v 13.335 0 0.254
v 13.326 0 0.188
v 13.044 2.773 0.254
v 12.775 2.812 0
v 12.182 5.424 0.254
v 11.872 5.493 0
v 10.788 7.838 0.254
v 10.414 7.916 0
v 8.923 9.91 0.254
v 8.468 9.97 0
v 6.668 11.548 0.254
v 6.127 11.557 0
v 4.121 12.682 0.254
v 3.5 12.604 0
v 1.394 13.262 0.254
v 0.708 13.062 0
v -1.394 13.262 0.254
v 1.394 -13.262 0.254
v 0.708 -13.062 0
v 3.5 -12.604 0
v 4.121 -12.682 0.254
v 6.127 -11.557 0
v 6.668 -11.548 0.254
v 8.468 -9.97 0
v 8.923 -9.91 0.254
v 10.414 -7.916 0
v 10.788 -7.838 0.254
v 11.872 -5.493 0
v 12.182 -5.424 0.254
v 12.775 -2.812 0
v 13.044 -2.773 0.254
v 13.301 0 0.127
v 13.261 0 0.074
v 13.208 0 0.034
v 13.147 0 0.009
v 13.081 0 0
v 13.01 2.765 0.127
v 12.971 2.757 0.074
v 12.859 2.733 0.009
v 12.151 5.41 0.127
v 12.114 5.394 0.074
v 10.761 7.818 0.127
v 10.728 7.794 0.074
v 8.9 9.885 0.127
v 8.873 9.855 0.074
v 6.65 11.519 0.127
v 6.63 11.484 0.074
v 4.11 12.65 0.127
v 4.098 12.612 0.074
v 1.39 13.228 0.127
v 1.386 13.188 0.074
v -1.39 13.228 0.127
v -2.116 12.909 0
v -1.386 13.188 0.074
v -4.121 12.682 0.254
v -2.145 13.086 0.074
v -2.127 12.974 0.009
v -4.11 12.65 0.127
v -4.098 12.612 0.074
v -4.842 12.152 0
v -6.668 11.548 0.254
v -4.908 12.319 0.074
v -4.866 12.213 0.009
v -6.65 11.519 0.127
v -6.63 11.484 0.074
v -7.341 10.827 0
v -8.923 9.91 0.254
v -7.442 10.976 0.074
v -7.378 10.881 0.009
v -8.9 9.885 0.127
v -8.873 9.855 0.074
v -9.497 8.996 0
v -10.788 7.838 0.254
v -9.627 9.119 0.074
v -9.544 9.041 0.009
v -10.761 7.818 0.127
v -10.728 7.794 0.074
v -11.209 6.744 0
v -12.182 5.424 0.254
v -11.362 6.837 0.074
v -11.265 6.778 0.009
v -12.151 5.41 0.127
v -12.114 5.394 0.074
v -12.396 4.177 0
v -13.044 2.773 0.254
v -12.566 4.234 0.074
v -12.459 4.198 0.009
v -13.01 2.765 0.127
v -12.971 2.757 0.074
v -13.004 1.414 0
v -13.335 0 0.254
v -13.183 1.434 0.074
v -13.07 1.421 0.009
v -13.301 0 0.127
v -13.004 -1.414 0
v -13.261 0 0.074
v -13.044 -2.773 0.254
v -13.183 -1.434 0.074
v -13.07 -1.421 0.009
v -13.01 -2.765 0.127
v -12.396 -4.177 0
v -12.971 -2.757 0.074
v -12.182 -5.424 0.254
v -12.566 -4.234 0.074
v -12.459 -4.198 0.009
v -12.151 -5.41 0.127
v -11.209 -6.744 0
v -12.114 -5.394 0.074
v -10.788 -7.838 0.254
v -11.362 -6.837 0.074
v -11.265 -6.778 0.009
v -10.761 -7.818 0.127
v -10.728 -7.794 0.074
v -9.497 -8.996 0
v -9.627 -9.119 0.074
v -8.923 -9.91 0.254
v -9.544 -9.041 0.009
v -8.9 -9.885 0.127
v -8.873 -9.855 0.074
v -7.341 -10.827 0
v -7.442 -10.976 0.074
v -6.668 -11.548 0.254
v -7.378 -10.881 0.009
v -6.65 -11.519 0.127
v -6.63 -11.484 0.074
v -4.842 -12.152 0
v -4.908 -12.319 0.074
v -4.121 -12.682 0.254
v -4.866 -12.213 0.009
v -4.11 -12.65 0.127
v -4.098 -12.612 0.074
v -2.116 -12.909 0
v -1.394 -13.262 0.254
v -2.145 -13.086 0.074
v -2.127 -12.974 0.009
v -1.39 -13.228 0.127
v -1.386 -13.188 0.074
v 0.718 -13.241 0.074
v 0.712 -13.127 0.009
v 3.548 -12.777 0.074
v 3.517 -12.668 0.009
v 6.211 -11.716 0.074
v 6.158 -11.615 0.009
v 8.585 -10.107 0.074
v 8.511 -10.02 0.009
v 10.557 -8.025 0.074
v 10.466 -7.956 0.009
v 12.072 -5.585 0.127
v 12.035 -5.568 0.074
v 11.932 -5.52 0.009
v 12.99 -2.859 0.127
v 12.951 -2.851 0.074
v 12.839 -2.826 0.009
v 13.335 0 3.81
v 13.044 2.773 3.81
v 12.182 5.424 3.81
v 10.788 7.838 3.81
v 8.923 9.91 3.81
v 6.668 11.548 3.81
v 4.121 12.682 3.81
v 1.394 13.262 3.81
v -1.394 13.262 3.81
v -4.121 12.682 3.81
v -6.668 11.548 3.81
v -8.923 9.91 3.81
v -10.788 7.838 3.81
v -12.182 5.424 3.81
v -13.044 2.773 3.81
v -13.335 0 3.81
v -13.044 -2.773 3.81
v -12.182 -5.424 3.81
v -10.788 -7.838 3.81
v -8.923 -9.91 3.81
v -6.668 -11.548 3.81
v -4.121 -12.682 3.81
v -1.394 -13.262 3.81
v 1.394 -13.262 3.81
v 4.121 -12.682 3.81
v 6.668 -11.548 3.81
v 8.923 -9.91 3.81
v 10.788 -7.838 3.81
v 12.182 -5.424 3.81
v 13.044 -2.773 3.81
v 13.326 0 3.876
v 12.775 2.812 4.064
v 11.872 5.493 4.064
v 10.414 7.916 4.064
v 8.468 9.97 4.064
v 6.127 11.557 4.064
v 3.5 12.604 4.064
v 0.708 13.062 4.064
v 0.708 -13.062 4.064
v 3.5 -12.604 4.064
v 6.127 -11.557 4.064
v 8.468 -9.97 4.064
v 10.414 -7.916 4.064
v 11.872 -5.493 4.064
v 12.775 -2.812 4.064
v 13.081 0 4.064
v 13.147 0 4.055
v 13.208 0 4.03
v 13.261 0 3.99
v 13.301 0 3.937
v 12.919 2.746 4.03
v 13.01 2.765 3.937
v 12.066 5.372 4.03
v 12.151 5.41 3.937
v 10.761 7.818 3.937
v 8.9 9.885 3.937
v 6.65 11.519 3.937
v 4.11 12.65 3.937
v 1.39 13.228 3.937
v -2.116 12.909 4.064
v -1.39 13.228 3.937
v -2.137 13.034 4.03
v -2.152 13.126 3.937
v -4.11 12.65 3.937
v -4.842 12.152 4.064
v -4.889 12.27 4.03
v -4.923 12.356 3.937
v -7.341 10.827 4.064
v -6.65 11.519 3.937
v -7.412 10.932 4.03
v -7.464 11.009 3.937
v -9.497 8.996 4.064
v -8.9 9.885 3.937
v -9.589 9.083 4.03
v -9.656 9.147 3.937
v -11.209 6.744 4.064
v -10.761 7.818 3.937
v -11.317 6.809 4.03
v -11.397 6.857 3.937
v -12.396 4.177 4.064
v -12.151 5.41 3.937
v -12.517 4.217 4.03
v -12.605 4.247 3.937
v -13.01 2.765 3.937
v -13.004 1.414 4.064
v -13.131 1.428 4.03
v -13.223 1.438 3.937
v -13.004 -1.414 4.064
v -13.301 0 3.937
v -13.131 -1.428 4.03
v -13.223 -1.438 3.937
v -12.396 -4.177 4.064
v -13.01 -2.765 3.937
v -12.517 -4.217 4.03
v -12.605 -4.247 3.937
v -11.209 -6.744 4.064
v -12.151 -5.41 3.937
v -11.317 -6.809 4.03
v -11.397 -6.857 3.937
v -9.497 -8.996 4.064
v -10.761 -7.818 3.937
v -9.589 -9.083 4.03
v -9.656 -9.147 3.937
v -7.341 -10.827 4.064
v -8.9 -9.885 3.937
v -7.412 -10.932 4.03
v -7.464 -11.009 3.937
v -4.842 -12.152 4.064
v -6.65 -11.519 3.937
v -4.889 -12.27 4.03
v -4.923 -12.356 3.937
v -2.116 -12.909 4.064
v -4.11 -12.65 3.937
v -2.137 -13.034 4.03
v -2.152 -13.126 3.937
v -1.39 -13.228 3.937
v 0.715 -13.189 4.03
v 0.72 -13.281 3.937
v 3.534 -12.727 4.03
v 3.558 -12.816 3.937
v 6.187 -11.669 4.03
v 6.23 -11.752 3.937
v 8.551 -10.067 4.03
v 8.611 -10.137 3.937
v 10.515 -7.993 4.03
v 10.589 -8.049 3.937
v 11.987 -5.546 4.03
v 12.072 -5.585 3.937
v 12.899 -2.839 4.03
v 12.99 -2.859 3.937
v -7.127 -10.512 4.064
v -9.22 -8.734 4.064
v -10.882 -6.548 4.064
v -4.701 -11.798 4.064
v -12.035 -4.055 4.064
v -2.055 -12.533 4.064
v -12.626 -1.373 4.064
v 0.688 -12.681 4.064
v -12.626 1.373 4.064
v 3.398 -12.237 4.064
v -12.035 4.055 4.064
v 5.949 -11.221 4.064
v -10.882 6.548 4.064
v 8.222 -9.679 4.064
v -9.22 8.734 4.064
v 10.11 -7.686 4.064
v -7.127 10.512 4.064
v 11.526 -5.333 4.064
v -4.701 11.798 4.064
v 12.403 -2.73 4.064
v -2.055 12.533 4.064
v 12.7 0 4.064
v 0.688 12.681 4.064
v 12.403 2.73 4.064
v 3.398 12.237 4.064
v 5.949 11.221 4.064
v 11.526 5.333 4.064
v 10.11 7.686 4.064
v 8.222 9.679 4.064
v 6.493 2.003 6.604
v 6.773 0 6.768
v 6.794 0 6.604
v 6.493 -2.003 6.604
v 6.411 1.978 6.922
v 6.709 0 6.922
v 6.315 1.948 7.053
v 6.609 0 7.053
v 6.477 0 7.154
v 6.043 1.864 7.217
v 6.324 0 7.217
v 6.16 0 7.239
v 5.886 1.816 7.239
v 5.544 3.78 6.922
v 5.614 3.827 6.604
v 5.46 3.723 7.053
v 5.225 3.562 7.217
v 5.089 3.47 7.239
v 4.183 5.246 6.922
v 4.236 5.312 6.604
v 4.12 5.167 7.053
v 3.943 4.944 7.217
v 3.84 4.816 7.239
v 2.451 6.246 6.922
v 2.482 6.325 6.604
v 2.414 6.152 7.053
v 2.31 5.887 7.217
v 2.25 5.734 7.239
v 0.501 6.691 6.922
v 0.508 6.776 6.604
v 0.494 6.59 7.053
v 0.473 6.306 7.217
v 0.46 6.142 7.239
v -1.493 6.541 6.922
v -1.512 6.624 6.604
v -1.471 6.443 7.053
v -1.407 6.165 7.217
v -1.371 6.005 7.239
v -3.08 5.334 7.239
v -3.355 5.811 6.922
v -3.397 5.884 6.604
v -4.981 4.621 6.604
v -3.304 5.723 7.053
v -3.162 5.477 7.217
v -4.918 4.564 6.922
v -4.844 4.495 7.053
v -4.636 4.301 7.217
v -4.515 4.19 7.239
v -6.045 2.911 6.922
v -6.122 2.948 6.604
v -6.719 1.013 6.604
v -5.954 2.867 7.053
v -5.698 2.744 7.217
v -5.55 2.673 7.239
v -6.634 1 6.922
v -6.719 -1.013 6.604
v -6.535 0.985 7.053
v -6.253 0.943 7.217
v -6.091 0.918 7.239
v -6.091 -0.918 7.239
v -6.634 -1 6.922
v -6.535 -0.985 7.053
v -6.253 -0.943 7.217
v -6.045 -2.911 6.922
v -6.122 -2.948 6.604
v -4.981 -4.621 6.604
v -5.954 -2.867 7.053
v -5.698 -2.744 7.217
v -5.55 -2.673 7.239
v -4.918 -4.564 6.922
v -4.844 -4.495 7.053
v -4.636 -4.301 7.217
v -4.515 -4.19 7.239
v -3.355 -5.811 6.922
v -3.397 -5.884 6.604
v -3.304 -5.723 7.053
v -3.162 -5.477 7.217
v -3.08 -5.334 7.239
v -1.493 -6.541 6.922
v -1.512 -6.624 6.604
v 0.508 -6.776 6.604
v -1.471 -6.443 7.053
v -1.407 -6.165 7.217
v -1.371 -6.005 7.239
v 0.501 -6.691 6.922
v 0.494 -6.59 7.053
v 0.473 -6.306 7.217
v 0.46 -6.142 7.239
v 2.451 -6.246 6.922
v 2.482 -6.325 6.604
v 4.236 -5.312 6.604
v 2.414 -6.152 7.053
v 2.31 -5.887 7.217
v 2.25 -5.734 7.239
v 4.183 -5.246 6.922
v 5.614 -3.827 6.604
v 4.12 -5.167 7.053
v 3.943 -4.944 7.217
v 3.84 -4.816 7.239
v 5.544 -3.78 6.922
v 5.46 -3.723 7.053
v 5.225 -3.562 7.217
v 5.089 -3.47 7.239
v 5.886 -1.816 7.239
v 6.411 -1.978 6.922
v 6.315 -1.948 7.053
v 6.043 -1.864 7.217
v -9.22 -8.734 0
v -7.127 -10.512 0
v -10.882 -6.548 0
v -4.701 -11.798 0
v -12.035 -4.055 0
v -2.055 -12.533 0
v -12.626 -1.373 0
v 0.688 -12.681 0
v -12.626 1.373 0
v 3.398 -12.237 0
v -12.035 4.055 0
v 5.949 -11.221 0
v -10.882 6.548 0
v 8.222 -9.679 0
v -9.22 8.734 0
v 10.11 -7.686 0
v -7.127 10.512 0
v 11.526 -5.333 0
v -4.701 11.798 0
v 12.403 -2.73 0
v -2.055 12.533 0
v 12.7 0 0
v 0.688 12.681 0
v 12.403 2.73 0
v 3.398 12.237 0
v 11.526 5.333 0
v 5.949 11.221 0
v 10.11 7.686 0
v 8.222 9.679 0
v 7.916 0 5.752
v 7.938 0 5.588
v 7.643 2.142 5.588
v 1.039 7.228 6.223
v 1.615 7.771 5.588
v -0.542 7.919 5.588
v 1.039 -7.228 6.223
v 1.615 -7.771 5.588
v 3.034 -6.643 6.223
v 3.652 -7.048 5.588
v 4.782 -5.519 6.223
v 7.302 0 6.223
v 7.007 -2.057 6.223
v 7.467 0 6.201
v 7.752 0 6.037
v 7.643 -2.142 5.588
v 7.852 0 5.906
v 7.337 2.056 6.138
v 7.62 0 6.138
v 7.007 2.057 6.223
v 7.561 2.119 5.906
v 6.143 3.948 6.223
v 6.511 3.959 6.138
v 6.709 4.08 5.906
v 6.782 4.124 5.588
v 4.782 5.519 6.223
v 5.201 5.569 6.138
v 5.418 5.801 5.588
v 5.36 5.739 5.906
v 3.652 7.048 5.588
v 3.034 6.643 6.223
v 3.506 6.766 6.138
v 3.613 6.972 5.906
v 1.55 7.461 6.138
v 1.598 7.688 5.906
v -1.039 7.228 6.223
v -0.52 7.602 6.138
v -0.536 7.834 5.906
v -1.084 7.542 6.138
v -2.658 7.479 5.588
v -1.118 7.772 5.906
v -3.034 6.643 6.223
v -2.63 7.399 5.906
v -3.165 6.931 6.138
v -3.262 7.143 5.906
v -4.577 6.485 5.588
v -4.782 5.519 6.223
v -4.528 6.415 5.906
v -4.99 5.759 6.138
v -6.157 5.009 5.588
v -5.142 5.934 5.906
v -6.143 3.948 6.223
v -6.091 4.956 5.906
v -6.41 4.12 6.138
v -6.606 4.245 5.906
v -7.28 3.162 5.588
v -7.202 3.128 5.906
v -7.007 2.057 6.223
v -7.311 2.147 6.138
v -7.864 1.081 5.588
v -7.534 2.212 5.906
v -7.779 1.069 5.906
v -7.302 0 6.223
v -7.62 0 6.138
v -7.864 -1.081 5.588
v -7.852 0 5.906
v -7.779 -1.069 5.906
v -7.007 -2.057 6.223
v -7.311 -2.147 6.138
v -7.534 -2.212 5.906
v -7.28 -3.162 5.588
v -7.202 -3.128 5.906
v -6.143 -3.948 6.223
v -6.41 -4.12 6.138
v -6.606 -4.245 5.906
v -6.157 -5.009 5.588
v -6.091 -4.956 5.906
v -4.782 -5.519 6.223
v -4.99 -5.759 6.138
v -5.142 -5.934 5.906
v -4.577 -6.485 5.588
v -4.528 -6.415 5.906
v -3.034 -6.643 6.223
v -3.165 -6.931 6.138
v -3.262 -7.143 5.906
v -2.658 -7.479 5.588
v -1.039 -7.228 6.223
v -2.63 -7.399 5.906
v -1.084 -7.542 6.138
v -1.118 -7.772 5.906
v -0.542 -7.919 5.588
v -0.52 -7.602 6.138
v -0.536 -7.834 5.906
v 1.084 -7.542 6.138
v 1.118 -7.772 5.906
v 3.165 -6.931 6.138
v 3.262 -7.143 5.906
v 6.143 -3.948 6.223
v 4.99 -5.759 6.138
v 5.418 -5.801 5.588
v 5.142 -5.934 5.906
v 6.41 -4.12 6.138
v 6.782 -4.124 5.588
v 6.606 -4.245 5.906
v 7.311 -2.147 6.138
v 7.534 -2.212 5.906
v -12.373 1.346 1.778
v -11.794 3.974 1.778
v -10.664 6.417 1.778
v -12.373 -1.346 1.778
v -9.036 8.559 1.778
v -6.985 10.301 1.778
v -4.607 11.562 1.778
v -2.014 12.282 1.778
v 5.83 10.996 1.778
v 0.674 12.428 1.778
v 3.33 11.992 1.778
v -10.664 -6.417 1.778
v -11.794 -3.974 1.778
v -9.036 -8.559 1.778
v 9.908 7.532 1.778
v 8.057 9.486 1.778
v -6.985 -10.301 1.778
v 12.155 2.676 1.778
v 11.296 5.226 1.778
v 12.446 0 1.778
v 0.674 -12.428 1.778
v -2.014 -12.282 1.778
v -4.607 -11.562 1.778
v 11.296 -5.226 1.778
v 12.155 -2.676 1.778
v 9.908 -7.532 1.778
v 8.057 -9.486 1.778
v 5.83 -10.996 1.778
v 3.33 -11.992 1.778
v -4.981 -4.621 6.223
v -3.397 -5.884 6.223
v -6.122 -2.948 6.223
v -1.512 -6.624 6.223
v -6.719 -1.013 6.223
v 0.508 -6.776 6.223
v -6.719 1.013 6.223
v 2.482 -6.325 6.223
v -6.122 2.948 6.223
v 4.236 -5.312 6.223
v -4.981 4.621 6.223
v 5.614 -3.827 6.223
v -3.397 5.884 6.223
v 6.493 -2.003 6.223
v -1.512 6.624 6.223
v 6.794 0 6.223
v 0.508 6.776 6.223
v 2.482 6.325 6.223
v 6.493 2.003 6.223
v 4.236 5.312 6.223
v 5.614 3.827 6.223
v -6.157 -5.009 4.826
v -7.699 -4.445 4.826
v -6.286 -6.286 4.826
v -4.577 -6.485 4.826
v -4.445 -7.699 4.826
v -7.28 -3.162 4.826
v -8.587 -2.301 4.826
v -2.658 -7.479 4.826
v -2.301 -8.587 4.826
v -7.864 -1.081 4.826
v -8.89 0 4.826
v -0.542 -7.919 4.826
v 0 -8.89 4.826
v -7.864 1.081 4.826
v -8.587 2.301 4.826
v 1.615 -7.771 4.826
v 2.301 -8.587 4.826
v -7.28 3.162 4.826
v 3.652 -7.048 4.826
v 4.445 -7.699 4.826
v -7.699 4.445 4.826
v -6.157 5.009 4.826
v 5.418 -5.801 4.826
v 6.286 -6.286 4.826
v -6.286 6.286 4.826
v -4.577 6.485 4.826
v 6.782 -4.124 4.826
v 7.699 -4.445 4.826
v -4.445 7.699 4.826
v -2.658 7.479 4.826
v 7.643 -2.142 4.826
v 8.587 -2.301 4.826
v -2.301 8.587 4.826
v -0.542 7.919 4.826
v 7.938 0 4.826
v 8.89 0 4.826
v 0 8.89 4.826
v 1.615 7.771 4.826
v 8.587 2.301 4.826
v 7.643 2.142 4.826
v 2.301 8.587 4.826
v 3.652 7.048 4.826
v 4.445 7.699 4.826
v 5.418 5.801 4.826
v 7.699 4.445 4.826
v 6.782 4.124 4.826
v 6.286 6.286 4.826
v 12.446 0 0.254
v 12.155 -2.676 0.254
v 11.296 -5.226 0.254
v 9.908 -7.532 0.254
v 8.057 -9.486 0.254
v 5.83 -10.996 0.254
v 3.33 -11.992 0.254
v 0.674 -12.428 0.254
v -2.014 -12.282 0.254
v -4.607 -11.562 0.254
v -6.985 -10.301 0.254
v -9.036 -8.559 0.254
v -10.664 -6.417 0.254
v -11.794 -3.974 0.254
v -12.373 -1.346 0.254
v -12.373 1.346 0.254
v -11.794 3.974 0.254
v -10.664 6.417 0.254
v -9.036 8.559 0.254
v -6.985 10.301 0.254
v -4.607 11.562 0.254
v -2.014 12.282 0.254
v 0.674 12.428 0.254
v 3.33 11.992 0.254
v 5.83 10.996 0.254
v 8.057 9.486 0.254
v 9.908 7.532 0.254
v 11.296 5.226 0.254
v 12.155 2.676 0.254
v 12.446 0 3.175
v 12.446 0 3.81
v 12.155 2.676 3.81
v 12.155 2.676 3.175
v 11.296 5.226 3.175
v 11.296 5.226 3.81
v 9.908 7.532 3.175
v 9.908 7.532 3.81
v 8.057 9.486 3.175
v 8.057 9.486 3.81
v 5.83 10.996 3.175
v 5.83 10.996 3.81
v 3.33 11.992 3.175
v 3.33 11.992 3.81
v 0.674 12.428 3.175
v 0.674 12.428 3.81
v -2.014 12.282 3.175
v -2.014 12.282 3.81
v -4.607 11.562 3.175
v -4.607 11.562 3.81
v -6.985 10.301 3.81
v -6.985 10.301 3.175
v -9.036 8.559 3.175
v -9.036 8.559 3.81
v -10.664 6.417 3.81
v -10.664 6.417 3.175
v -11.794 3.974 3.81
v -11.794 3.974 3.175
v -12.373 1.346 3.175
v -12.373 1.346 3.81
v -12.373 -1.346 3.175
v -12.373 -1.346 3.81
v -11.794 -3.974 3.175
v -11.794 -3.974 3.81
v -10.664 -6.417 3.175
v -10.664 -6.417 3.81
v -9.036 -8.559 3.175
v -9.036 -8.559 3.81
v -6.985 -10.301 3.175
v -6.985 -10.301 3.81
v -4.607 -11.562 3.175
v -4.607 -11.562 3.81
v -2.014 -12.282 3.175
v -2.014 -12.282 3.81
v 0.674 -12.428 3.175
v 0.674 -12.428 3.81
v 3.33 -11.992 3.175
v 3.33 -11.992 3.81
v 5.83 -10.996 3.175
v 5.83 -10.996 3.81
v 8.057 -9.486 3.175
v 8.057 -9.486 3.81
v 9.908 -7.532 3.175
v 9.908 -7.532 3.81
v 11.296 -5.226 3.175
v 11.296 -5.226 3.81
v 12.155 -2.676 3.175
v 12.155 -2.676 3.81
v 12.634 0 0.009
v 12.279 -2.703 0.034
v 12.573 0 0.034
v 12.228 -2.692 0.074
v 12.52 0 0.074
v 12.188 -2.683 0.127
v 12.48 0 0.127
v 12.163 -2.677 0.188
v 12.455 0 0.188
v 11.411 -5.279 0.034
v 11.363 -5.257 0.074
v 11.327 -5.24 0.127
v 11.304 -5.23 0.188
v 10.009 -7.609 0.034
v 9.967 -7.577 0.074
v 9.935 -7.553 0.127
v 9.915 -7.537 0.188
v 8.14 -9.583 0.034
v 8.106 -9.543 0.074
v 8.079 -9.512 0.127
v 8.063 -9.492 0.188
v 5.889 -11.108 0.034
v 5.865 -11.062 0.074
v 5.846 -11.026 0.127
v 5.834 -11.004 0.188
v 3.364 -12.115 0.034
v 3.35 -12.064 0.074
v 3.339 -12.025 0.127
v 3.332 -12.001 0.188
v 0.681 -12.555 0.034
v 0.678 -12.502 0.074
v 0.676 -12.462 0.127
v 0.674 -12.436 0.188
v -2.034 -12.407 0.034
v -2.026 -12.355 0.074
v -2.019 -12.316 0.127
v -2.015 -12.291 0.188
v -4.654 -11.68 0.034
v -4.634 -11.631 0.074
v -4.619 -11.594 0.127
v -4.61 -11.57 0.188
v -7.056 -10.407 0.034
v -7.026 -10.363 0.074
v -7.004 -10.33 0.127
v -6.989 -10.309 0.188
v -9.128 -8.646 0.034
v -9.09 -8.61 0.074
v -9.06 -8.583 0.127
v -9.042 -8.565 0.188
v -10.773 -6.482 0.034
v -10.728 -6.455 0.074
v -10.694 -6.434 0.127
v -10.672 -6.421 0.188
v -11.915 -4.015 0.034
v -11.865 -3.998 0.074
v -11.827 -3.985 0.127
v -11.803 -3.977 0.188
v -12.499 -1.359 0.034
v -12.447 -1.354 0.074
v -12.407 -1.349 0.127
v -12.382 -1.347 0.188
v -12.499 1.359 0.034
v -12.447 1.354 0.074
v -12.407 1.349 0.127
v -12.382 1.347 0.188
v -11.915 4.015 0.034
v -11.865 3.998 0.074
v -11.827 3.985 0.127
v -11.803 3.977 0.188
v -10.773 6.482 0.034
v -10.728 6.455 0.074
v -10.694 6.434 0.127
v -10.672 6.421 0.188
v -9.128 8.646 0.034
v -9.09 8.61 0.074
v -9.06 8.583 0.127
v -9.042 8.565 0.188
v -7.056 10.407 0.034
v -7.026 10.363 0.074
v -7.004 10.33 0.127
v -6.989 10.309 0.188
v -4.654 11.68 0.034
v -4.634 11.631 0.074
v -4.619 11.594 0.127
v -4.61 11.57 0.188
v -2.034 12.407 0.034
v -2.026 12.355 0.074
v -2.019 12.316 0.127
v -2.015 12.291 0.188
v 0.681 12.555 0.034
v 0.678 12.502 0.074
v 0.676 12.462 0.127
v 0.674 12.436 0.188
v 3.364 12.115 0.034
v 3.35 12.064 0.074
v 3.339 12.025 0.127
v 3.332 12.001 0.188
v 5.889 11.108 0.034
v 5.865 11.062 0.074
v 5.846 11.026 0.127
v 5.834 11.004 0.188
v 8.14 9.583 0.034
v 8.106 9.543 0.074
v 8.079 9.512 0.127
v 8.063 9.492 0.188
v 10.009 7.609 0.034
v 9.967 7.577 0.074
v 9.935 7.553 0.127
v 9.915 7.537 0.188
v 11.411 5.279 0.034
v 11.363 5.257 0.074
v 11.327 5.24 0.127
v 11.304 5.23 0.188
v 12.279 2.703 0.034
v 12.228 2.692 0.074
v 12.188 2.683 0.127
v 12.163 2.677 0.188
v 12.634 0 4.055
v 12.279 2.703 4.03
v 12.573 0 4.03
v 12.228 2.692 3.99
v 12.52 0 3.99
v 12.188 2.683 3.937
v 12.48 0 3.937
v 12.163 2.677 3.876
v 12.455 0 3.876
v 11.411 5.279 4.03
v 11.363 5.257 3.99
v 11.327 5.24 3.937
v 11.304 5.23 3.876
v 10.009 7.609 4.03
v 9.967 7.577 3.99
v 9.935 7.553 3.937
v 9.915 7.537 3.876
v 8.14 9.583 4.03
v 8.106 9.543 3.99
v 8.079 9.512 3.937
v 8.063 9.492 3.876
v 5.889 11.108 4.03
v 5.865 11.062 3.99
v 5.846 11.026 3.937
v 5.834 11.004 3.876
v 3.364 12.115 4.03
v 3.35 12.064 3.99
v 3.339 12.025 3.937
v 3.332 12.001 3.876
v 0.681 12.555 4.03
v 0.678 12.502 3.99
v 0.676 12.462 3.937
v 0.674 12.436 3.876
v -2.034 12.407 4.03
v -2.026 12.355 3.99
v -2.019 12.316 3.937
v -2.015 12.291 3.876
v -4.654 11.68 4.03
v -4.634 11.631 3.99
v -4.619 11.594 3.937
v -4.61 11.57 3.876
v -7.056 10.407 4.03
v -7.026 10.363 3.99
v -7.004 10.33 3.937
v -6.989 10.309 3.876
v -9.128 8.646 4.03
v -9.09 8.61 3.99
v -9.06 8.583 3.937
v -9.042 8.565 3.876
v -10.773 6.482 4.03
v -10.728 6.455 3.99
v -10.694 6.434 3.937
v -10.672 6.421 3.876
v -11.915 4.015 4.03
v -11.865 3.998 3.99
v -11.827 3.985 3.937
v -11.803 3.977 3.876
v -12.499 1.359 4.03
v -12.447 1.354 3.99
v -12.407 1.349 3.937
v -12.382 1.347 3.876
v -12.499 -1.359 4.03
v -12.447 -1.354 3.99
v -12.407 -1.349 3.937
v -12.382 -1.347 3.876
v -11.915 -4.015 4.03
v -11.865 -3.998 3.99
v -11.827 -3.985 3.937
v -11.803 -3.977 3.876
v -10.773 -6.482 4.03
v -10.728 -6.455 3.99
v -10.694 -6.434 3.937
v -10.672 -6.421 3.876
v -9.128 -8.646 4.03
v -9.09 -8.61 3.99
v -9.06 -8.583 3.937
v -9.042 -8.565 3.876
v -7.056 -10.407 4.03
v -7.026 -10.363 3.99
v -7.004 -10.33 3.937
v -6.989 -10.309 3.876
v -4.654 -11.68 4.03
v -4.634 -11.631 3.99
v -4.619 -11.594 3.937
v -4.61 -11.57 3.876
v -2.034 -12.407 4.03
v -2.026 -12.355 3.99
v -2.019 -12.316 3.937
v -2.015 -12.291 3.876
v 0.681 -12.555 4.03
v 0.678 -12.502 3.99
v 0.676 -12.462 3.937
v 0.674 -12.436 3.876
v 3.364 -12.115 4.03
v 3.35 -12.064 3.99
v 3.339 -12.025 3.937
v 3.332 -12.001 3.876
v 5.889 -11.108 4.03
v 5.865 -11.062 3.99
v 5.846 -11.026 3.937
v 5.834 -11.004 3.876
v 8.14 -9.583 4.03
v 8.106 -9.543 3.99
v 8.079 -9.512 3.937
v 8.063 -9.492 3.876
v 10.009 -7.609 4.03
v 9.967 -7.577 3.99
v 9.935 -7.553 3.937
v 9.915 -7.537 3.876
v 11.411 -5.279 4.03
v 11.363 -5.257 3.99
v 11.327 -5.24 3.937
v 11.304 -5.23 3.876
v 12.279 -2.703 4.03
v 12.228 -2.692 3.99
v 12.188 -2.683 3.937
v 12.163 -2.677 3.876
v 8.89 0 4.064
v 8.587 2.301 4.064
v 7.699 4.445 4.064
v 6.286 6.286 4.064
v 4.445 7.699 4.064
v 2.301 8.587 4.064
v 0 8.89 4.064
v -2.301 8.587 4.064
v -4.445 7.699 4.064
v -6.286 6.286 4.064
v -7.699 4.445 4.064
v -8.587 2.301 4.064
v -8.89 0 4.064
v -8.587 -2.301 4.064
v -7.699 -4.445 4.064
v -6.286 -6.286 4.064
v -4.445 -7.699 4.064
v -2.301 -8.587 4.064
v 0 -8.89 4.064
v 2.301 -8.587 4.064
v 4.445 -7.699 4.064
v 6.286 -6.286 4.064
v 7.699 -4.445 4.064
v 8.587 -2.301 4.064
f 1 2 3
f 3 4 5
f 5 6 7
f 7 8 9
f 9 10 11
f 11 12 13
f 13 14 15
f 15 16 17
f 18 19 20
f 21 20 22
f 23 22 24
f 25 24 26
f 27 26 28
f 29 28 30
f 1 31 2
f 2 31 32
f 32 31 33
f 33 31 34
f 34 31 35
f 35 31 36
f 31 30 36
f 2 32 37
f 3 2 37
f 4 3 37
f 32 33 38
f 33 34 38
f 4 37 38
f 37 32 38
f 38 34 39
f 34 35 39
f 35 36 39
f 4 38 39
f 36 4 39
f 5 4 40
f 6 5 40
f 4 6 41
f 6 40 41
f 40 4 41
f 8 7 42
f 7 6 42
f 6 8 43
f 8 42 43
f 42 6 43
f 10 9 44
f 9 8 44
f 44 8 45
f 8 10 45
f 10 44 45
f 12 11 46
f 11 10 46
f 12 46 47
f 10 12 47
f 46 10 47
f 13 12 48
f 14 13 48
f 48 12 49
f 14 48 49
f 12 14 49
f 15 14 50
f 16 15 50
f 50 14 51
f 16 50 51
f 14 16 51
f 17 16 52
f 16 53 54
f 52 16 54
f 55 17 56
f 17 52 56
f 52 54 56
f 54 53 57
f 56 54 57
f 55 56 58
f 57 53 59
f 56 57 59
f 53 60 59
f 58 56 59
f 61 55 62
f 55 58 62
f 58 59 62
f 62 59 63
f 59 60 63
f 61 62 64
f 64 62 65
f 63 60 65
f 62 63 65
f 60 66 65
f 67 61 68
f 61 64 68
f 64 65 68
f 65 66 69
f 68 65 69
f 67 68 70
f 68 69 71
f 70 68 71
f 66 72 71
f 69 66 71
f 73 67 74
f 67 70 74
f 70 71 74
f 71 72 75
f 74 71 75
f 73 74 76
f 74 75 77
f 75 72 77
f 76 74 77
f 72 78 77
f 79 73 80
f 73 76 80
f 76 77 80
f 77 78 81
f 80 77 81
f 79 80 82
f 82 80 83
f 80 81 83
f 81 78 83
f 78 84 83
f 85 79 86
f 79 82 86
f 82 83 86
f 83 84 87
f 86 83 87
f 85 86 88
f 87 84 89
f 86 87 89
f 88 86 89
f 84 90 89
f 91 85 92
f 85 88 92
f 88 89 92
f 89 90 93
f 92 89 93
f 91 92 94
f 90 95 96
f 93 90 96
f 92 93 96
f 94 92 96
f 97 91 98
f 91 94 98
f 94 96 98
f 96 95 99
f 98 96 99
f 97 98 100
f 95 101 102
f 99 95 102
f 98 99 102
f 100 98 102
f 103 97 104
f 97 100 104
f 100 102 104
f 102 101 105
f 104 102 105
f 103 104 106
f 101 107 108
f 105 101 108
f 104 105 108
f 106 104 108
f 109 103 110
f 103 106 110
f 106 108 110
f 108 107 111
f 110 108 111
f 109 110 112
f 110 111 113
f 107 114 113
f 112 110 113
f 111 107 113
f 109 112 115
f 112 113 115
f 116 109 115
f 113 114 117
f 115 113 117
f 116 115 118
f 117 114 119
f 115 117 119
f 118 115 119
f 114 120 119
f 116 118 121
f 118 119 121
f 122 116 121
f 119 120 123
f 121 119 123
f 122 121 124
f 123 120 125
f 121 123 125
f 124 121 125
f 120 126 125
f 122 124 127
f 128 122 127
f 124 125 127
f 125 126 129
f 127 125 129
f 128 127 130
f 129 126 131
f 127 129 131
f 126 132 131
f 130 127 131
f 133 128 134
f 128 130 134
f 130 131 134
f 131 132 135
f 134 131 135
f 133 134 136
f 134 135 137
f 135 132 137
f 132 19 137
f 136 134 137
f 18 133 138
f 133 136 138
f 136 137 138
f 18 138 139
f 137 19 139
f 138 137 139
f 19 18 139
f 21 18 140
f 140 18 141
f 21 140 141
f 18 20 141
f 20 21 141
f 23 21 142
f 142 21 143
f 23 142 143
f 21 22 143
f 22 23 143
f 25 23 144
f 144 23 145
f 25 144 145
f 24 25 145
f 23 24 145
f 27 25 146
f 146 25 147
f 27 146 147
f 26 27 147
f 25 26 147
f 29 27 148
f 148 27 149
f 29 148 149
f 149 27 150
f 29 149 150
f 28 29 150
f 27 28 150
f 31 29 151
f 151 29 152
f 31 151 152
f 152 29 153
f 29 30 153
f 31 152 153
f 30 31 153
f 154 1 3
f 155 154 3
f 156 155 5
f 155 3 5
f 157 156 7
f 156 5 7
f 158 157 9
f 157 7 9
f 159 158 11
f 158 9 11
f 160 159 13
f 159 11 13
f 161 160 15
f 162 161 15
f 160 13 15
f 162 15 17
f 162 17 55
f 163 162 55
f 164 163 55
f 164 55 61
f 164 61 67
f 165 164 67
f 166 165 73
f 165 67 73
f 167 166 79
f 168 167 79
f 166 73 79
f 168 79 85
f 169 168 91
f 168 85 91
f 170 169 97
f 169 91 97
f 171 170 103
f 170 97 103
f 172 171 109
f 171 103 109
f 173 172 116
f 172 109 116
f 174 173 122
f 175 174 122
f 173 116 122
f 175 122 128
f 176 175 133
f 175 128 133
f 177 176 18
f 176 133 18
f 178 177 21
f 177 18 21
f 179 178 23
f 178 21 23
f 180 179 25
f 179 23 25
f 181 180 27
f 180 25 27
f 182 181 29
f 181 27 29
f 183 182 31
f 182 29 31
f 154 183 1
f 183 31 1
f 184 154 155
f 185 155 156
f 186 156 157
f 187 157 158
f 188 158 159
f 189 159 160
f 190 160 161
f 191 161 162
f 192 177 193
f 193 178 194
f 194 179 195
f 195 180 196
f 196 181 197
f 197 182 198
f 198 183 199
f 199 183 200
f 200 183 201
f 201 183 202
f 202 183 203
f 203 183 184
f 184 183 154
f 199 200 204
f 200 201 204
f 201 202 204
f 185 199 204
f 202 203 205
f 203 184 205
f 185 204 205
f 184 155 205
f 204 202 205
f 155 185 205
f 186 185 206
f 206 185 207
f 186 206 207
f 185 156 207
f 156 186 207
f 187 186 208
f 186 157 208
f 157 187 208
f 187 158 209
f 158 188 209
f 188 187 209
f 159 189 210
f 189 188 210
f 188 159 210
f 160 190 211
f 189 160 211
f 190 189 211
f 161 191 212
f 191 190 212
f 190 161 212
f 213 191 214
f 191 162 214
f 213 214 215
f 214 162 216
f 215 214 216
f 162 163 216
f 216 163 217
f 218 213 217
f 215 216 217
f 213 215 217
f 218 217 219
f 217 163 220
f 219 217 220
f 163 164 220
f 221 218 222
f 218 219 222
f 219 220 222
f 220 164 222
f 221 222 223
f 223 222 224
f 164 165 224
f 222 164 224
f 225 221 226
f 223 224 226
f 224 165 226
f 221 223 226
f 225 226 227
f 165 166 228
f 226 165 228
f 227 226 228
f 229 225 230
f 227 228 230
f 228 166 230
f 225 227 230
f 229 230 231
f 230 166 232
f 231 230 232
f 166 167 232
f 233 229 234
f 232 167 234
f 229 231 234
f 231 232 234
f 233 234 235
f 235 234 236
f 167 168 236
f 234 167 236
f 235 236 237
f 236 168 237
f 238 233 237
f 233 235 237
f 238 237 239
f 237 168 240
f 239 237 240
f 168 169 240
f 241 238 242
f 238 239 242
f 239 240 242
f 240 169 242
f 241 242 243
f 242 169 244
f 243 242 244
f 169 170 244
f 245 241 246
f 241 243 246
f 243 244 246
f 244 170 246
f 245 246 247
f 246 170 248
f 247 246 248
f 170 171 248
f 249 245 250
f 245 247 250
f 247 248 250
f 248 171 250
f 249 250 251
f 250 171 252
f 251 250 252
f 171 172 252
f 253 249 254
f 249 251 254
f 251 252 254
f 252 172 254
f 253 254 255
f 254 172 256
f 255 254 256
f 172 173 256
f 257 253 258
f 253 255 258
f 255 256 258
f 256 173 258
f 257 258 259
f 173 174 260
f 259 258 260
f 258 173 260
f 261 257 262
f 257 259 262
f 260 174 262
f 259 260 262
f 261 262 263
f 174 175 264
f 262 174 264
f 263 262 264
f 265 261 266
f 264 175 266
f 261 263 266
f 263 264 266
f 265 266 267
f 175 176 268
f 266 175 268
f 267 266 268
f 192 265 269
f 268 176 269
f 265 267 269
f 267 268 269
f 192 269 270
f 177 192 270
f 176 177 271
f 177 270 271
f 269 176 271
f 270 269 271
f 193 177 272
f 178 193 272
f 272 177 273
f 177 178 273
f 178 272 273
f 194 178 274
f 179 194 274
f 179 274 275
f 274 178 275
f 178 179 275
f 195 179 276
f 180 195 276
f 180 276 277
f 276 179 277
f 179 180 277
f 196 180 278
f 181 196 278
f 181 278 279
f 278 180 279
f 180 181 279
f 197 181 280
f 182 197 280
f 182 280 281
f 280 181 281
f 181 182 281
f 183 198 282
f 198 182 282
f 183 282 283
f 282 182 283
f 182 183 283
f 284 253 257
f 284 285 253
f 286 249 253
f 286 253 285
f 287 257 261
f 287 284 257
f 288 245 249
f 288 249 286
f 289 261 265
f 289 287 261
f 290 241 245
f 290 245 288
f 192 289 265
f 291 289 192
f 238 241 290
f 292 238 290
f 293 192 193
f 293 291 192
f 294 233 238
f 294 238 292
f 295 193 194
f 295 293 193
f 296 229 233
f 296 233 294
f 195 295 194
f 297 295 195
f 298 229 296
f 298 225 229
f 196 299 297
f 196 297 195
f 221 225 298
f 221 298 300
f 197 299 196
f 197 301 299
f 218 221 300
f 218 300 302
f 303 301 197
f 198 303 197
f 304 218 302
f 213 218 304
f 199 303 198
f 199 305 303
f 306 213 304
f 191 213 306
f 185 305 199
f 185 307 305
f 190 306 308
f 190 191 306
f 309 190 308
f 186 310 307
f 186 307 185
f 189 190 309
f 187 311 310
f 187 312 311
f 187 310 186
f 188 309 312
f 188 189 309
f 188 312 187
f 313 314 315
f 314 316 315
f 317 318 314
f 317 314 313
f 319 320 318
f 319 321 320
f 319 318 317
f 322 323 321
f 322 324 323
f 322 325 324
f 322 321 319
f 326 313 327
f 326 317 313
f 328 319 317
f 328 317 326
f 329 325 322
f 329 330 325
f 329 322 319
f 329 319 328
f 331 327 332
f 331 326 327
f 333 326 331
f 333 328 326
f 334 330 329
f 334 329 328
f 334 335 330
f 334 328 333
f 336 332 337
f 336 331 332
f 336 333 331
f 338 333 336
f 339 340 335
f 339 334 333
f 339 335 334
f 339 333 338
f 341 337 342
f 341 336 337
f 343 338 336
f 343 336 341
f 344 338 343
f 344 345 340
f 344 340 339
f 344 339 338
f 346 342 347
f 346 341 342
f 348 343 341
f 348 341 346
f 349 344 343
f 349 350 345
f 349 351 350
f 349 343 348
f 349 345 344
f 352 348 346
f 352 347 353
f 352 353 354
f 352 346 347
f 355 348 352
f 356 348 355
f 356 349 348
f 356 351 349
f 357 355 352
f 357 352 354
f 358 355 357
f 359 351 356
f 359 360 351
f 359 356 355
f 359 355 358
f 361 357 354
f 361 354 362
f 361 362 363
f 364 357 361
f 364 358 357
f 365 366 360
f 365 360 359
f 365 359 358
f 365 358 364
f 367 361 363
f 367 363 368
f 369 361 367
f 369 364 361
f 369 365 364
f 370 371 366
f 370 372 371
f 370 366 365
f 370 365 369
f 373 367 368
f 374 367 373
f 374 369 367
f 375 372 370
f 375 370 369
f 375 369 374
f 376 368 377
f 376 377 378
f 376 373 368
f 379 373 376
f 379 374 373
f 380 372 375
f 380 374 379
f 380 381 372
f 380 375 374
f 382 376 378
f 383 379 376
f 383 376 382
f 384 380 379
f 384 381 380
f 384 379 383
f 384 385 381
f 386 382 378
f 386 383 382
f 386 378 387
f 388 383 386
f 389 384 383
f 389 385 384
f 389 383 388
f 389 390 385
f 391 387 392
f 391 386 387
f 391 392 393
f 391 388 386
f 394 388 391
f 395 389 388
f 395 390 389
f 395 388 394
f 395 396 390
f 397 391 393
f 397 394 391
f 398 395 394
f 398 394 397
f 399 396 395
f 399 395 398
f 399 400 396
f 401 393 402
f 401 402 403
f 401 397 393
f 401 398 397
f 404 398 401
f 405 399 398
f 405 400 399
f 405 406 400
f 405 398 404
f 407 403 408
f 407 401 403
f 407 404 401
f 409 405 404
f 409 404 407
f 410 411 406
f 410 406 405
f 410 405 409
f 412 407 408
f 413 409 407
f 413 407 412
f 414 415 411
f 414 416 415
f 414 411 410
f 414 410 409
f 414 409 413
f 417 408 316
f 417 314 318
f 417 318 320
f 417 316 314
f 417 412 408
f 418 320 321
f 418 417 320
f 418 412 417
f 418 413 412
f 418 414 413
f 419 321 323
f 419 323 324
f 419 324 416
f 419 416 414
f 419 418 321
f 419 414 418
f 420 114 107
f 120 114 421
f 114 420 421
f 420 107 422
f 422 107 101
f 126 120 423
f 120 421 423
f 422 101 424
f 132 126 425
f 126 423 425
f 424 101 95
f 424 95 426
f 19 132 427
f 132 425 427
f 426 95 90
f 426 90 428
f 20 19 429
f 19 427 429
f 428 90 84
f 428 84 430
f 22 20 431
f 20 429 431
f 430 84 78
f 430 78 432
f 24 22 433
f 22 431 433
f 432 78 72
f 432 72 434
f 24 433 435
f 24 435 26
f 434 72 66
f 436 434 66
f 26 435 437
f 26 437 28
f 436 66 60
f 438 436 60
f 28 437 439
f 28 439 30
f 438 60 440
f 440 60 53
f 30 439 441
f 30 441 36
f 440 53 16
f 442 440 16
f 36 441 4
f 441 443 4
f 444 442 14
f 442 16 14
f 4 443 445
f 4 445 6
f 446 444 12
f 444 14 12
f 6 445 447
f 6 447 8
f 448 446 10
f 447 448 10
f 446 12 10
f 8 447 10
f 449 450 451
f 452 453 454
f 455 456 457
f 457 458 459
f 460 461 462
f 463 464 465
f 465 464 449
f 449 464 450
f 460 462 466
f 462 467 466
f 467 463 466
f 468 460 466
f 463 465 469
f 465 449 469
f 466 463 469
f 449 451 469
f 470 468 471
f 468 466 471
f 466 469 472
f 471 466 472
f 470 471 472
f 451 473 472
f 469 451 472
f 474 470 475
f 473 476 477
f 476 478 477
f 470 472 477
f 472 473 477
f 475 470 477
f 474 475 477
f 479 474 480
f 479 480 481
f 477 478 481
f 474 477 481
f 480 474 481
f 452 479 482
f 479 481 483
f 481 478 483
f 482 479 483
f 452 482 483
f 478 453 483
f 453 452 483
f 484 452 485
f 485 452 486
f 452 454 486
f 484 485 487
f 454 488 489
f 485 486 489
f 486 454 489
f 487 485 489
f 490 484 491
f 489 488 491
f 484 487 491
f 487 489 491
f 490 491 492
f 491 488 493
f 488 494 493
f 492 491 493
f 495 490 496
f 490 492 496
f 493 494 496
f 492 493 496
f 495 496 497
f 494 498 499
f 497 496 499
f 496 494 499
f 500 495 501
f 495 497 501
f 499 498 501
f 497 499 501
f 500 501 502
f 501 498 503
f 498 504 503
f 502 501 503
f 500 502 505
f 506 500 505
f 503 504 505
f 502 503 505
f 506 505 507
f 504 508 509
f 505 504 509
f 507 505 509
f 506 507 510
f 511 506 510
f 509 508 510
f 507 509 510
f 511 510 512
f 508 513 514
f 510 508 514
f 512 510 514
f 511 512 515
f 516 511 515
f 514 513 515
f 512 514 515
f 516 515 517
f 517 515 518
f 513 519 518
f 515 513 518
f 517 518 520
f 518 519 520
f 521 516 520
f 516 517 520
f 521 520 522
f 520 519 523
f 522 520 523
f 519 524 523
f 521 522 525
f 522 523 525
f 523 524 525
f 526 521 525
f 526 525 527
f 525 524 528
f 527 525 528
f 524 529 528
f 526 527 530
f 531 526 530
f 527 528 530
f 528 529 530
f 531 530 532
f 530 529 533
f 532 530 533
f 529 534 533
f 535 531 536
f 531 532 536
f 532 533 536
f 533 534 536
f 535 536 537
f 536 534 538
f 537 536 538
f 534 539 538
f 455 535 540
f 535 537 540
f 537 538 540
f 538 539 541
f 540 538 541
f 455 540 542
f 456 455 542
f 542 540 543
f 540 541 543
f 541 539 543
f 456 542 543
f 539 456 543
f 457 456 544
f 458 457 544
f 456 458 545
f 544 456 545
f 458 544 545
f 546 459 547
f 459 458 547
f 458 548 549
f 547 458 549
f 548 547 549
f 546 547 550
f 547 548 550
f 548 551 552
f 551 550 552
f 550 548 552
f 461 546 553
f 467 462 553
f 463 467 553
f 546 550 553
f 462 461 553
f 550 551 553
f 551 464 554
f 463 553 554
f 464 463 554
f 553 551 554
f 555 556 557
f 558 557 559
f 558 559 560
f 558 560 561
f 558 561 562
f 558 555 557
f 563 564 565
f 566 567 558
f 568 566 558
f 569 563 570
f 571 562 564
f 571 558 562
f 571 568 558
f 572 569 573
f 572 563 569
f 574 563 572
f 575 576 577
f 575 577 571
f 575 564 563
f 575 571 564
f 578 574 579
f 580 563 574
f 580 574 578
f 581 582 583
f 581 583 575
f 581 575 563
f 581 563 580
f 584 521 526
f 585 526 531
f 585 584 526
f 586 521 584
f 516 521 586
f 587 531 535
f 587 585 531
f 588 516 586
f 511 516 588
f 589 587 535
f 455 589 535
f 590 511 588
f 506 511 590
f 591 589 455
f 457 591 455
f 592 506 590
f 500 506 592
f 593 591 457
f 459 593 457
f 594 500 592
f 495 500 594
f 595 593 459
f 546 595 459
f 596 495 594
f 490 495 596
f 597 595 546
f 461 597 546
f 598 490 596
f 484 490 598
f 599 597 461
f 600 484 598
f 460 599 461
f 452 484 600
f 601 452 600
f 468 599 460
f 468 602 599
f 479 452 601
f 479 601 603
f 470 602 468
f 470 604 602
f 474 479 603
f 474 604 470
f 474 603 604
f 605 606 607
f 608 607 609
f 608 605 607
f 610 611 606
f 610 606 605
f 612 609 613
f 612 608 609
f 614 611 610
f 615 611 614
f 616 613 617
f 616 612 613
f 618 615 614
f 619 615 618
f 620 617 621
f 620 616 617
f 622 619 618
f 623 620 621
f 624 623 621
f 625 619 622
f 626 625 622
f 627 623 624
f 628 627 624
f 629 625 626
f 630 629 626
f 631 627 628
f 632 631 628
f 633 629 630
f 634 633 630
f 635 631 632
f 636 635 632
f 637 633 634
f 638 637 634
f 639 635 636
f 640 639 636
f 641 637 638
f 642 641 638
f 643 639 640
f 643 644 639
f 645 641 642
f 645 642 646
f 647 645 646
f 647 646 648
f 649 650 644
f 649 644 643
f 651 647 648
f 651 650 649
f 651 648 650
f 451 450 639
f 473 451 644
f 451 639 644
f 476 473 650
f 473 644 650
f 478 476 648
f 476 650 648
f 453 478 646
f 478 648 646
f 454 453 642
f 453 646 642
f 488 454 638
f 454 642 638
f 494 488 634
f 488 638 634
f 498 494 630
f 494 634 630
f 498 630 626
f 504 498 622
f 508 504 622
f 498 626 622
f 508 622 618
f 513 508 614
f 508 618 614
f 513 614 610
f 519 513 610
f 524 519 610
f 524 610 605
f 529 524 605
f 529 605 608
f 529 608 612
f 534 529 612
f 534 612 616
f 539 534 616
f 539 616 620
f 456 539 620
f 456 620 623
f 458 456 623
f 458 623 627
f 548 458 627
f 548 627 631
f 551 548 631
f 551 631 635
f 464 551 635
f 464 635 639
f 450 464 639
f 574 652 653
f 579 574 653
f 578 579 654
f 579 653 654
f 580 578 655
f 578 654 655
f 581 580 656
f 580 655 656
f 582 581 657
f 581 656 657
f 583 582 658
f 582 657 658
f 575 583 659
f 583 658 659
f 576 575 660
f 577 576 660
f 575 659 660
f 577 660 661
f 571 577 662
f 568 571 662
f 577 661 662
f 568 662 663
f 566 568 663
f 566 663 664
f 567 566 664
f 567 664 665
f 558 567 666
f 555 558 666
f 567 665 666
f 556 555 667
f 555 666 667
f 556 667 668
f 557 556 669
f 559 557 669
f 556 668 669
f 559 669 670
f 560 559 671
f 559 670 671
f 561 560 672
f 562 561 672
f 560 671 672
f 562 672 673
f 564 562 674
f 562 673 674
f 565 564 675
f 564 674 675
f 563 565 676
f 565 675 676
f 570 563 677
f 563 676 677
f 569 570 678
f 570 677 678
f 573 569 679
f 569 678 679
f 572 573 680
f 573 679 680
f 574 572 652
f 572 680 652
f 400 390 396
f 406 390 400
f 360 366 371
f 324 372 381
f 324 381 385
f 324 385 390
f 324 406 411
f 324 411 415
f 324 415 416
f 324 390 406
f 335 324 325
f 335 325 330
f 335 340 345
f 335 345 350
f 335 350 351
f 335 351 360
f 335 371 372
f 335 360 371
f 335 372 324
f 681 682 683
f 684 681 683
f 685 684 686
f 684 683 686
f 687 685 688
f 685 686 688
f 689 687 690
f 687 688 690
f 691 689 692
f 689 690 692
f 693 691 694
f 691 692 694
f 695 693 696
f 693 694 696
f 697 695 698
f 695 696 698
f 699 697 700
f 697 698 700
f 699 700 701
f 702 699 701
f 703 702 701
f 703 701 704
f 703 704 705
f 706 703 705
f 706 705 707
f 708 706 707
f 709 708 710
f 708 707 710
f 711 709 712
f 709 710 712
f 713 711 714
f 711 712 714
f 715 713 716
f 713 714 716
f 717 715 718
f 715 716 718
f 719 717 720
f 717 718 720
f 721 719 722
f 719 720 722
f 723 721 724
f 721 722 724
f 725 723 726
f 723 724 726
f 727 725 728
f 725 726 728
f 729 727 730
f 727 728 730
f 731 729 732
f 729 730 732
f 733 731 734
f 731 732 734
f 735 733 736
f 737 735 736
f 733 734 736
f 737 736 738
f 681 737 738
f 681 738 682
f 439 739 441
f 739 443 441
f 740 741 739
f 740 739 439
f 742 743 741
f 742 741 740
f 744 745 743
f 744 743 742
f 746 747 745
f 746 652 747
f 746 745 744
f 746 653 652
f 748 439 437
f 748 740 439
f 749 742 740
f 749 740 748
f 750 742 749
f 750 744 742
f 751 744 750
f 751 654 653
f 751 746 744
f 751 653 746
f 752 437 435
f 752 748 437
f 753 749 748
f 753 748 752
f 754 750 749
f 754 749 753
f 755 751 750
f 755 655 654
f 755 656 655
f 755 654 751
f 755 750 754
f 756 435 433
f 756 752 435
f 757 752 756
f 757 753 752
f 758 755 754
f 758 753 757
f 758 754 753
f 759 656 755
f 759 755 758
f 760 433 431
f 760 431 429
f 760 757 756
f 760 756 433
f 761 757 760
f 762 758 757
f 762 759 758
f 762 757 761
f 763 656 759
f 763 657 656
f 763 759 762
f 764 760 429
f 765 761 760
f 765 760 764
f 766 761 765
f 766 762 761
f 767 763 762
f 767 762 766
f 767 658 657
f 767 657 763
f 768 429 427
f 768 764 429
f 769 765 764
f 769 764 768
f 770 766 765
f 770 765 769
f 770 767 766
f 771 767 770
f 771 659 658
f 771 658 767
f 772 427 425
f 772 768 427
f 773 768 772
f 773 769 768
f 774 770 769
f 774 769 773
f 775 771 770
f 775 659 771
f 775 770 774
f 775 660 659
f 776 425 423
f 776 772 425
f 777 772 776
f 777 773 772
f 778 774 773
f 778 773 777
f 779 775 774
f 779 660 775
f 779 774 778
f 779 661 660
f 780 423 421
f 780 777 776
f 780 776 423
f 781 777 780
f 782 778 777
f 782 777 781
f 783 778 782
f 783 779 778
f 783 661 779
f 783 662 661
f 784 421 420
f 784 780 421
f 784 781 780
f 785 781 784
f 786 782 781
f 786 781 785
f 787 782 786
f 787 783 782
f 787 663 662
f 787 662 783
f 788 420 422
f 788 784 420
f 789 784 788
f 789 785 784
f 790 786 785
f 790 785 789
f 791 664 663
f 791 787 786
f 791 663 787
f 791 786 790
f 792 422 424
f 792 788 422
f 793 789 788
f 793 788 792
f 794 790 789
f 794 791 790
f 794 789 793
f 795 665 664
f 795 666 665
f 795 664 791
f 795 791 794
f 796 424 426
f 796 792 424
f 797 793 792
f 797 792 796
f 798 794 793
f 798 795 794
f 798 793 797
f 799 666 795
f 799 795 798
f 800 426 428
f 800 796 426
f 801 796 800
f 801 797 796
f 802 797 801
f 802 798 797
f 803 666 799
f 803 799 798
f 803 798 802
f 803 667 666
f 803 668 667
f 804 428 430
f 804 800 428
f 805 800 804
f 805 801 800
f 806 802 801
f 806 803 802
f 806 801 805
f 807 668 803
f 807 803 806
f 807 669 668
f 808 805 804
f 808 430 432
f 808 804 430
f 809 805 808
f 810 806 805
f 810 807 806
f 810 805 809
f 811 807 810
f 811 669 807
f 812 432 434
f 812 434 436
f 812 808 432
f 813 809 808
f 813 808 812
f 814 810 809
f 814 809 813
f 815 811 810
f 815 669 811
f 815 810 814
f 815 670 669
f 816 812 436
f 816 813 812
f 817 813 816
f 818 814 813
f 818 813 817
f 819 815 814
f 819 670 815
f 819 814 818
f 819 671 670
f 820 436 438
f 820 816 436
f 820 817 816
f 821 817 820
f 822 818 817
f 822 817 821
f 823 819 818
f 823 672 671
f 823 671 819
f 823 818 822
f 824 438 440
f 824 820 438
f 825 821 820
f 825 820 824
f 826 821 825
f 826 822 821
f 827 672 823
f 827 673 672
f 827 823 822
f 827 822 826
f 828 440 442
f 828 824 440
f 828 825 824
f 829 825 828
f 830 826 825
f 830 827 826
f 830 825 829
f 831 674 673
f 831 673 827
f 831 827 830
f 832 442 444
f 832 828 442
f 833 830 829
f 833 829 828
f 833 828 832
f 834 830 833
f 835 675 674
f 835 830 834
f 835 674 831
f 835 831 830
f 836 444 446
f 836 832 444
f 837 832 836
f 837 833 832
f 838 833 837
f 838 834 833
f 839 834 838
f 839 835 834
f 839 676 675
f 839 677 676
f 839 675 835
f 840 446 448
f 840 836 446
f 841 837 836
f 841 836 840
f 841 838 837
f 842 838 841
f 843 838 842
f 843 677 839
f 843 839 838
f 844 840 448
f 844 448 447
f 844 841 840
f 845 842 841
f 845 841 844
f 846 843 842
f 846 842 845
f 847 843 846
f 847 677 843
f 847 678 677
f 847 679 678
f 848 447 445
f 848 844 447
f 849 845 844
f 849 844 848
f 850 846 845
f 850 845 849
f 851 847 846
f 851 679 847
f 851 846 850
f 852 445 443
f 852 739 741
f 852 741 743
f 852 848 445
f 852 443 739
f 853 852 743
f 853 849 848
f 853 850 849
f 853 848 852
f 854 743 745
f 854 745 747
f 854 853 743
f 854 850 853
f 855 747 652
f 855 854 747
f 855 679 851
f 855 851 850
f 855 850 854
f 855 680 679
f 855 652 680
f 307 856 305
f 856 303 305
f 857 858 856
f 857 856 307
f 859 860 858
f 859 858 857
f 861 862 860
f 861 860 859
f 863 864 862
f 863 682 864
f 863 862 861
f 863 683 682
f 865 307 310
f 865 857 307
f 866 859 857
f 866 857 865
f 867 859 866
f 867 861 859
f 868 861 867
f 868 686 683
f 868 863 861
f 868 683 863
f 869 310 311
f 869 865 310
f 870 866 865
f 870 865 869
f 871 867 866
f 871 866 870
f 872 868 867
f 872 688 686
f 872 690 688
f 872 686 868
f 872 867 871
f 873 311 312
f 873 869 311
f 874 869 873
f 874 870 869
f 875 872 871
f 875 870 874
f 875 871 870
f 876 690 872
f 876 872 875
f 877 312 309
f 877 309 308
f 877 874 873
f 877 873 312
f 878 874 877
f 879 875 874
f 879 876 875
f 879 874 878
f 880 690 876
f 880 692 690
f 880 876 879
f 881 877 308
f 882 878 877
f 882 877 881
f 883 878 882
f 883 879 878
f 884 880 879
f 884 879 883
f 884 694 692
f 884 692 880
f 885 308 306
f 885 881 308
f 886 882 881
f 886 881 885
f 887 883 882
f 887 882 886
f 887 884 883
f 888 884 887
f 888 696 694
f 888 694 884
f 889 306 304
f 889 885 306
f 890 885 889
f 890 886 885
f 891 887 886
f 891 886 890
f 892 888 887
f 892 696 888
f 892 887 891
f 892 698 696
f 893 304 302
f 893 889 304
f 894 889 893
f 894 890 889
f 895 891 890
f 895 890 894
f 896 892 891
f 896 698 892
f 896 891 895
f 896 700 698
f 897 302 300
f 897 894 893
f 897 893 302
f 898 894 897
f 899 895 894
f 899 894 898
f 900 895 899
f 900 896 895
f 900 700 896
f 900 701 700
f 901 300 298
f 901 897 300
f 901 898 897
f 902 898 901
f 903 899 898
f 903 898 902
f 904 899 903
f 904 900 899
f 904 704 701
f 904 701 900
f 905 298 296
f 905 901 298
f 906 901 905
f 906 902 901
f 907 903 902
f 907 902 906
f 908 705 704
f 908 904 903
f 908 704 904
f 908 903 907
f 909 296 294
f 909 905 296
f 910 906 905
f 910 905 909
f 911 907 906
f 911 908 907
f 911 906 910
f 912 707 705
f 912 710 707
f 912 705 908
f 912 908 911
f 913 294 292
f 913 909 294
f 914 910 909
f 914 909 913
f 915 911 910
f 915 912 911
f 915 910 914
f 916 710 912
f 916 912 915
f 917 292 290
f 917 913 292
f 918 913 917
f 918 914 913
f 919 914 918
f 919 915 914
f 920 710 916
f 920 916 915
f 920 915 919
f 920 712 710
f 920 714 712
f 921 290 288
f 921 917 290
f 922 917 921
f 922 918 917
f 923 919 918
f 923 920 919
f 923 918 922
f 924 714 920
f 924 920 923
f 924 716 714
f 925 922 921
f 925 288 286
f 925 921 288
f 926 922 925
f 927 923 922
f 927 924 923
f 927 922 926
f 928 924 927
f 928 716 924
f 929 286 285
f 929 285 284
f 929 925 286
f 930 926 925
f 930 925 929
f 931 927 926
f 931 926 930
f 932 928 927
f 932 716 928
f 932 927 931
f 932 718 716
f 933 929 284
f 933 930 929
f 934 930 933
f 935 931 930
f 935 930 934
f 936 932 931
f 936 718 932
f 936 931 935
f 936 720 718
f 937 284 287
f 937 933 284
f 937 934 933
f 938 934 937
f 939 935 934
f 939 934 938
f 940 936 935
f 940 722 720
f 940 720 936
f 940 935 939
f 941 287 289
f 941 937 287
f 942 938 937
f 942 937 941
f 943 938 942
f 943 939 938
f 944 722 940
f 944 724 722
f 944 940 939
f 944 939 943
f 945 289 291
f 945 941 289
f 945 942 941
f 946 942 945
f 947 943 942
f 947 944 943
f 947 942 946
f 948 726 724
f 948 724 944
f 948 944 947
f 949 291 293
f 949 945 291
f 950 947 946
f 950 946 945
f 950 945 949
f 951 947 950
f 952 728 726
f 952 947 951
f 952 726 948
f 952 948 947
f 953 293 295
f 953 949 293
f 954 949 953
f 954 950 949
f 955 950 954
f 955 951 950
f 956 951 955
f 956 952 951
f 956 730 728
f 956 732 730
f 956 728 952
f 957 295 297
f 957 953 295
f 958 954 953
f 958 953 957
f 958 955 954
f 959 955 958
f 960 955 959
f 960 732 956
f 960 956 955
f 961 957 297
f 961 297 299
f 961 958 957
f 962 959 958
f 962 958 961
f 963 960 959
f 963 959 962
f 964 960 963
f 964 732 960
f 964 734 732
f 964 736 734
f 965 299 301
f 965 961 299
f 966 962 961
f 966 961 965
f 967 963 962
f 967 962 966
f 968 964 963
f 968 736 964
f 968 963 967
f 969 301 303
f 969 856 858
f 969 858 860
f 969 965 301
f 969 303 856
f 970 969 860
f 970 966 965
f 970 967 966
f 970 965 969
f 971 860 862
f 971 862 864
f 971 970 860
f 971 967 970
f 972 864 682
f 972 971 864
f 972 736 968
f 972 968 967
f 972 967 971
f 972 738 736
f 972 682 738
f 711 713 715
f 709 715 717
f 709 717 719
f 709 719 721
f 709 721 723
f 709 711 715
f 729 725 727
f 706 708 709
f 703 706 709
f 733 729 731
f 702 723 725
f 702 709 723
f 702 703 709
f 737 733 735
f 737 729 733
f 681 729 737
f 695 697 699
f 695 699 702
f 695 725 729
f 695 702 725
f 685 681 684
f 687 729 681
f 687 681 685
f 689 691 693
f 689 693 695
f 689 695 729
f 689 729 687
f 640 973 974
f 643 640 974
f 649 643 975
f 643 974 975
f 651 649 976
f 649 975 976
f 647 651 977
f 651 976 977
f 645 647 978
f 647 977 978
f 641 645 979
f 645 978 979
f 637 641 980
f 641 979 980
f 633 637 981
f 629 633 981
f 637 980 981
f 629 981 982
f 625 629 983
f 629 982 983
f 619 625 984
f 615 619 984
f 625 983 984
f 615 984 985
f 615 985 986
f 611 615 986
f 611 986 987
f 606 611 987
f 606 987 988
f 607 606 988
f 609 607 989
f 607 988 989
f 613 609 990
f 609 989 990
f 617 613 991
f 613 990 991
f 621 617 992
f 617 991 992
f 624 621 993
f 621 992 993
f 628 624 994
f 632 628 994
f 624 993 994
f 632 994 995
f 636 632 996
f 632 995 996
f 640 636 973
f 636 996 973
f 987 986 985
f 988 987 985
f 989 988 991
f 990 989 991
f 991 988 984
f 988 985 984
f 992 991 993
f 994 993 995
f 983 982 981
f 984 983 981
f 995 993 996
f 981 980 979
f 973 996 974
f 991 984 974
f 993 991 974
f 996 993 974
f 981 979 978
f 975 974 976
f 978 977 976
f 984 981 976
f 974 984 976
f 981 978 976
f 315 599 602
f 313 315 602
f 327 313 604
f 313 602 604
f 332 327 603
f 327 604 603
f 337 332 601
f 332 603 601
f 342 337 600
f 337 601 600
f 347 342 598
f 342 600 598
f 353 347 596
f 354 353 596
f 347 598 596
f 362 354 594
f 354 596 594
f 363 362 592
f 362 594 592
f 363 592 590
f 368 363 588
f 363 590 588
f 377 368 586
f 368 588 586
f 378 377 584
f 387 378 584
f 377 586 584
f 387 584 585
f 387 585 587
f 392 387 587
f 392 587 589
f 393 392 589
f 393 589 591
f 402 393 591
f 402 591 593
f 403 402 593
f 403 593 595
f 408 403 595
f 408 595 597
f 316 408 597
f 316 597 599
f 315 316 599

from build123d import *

# Parameters (mm, degrees)
F0_R      = 13.335
F1_DEPTH  = 4.064
F2_R      = 8.89
F3_DEPTH  = 0.762
F4_R      = 7.9375
F5_DEPTH  = 2.159
F6_R      = 6.7945
F7_DEPTH  = 3.175
F8_R      = 0.635
F9_R      = 12.446
F10_DEPTH = 0.889
F11_R     = 12.446
F12_DEPTH = 1.778
F13_R     = 0.254


with BuildPart() as f1:
    # F0 (on Top) → F1 (new body)
    with BuildSketch(Plane.XY):
        Circle(F0_R)
    extrude(amount=F1_DEPTH)

    # F2 (on face) → F3 (join)
    with BuildSketch(Plane.XY.offset(4.064)):
        Circle(F2_R)
    extrude(amount=F3_DEPTH)

    # F4 (on face) → F5 (join)
    with BuildSketch(Plane.XY.offset(4.064)):
        Circle(F4_R)
    extrude(amount=F5_DEPTH)

    # F6 (on face) → F7 (join)
    with BuildSketch(Plane.XY.offset(4.064)):
        Circle(F6_R)
    extrude(amount=F7_DEPTH)

    # F8
    f8_edges = [f1.edges().sort_by_distance(p)[0] for p in [
        (-7.9375, 0, 6.223),
        (-6.7945, 0, 7.239),
    ]]
    fillet(f8_edges, radius=F8_R)

    # F9 (on face) → F10 (cut)
    with BuildSketch(Plane.XY.offset(4.064)):
        Circle(F9_R)
    extrude(amount=-F10_DEPTH, mode=Mode.SUBTRACT)

    # F11 (on face) → F12 (cut)
    with BuildSketch(Plane(origin=(0, 0, 0), x_dir=(1, 0, 0), z_dir=(0, 0, -1))):
        Circle(F11_R)
    extrude(amount=-F12_DEPTH, mode=Mode.SUBTRACT)

    # F13
    f13_edges = [f1.edges().sort_by_distance(p)[0] for p in [
        (-12.446, 0, 4.064),
        (-13.335, 0, 4.064),
        (-13.335, 0, 0),
        (-12.446, 0, 0),
    ]]
    fillet(f13_edges, radius=F13_R)


solid = f1.part
